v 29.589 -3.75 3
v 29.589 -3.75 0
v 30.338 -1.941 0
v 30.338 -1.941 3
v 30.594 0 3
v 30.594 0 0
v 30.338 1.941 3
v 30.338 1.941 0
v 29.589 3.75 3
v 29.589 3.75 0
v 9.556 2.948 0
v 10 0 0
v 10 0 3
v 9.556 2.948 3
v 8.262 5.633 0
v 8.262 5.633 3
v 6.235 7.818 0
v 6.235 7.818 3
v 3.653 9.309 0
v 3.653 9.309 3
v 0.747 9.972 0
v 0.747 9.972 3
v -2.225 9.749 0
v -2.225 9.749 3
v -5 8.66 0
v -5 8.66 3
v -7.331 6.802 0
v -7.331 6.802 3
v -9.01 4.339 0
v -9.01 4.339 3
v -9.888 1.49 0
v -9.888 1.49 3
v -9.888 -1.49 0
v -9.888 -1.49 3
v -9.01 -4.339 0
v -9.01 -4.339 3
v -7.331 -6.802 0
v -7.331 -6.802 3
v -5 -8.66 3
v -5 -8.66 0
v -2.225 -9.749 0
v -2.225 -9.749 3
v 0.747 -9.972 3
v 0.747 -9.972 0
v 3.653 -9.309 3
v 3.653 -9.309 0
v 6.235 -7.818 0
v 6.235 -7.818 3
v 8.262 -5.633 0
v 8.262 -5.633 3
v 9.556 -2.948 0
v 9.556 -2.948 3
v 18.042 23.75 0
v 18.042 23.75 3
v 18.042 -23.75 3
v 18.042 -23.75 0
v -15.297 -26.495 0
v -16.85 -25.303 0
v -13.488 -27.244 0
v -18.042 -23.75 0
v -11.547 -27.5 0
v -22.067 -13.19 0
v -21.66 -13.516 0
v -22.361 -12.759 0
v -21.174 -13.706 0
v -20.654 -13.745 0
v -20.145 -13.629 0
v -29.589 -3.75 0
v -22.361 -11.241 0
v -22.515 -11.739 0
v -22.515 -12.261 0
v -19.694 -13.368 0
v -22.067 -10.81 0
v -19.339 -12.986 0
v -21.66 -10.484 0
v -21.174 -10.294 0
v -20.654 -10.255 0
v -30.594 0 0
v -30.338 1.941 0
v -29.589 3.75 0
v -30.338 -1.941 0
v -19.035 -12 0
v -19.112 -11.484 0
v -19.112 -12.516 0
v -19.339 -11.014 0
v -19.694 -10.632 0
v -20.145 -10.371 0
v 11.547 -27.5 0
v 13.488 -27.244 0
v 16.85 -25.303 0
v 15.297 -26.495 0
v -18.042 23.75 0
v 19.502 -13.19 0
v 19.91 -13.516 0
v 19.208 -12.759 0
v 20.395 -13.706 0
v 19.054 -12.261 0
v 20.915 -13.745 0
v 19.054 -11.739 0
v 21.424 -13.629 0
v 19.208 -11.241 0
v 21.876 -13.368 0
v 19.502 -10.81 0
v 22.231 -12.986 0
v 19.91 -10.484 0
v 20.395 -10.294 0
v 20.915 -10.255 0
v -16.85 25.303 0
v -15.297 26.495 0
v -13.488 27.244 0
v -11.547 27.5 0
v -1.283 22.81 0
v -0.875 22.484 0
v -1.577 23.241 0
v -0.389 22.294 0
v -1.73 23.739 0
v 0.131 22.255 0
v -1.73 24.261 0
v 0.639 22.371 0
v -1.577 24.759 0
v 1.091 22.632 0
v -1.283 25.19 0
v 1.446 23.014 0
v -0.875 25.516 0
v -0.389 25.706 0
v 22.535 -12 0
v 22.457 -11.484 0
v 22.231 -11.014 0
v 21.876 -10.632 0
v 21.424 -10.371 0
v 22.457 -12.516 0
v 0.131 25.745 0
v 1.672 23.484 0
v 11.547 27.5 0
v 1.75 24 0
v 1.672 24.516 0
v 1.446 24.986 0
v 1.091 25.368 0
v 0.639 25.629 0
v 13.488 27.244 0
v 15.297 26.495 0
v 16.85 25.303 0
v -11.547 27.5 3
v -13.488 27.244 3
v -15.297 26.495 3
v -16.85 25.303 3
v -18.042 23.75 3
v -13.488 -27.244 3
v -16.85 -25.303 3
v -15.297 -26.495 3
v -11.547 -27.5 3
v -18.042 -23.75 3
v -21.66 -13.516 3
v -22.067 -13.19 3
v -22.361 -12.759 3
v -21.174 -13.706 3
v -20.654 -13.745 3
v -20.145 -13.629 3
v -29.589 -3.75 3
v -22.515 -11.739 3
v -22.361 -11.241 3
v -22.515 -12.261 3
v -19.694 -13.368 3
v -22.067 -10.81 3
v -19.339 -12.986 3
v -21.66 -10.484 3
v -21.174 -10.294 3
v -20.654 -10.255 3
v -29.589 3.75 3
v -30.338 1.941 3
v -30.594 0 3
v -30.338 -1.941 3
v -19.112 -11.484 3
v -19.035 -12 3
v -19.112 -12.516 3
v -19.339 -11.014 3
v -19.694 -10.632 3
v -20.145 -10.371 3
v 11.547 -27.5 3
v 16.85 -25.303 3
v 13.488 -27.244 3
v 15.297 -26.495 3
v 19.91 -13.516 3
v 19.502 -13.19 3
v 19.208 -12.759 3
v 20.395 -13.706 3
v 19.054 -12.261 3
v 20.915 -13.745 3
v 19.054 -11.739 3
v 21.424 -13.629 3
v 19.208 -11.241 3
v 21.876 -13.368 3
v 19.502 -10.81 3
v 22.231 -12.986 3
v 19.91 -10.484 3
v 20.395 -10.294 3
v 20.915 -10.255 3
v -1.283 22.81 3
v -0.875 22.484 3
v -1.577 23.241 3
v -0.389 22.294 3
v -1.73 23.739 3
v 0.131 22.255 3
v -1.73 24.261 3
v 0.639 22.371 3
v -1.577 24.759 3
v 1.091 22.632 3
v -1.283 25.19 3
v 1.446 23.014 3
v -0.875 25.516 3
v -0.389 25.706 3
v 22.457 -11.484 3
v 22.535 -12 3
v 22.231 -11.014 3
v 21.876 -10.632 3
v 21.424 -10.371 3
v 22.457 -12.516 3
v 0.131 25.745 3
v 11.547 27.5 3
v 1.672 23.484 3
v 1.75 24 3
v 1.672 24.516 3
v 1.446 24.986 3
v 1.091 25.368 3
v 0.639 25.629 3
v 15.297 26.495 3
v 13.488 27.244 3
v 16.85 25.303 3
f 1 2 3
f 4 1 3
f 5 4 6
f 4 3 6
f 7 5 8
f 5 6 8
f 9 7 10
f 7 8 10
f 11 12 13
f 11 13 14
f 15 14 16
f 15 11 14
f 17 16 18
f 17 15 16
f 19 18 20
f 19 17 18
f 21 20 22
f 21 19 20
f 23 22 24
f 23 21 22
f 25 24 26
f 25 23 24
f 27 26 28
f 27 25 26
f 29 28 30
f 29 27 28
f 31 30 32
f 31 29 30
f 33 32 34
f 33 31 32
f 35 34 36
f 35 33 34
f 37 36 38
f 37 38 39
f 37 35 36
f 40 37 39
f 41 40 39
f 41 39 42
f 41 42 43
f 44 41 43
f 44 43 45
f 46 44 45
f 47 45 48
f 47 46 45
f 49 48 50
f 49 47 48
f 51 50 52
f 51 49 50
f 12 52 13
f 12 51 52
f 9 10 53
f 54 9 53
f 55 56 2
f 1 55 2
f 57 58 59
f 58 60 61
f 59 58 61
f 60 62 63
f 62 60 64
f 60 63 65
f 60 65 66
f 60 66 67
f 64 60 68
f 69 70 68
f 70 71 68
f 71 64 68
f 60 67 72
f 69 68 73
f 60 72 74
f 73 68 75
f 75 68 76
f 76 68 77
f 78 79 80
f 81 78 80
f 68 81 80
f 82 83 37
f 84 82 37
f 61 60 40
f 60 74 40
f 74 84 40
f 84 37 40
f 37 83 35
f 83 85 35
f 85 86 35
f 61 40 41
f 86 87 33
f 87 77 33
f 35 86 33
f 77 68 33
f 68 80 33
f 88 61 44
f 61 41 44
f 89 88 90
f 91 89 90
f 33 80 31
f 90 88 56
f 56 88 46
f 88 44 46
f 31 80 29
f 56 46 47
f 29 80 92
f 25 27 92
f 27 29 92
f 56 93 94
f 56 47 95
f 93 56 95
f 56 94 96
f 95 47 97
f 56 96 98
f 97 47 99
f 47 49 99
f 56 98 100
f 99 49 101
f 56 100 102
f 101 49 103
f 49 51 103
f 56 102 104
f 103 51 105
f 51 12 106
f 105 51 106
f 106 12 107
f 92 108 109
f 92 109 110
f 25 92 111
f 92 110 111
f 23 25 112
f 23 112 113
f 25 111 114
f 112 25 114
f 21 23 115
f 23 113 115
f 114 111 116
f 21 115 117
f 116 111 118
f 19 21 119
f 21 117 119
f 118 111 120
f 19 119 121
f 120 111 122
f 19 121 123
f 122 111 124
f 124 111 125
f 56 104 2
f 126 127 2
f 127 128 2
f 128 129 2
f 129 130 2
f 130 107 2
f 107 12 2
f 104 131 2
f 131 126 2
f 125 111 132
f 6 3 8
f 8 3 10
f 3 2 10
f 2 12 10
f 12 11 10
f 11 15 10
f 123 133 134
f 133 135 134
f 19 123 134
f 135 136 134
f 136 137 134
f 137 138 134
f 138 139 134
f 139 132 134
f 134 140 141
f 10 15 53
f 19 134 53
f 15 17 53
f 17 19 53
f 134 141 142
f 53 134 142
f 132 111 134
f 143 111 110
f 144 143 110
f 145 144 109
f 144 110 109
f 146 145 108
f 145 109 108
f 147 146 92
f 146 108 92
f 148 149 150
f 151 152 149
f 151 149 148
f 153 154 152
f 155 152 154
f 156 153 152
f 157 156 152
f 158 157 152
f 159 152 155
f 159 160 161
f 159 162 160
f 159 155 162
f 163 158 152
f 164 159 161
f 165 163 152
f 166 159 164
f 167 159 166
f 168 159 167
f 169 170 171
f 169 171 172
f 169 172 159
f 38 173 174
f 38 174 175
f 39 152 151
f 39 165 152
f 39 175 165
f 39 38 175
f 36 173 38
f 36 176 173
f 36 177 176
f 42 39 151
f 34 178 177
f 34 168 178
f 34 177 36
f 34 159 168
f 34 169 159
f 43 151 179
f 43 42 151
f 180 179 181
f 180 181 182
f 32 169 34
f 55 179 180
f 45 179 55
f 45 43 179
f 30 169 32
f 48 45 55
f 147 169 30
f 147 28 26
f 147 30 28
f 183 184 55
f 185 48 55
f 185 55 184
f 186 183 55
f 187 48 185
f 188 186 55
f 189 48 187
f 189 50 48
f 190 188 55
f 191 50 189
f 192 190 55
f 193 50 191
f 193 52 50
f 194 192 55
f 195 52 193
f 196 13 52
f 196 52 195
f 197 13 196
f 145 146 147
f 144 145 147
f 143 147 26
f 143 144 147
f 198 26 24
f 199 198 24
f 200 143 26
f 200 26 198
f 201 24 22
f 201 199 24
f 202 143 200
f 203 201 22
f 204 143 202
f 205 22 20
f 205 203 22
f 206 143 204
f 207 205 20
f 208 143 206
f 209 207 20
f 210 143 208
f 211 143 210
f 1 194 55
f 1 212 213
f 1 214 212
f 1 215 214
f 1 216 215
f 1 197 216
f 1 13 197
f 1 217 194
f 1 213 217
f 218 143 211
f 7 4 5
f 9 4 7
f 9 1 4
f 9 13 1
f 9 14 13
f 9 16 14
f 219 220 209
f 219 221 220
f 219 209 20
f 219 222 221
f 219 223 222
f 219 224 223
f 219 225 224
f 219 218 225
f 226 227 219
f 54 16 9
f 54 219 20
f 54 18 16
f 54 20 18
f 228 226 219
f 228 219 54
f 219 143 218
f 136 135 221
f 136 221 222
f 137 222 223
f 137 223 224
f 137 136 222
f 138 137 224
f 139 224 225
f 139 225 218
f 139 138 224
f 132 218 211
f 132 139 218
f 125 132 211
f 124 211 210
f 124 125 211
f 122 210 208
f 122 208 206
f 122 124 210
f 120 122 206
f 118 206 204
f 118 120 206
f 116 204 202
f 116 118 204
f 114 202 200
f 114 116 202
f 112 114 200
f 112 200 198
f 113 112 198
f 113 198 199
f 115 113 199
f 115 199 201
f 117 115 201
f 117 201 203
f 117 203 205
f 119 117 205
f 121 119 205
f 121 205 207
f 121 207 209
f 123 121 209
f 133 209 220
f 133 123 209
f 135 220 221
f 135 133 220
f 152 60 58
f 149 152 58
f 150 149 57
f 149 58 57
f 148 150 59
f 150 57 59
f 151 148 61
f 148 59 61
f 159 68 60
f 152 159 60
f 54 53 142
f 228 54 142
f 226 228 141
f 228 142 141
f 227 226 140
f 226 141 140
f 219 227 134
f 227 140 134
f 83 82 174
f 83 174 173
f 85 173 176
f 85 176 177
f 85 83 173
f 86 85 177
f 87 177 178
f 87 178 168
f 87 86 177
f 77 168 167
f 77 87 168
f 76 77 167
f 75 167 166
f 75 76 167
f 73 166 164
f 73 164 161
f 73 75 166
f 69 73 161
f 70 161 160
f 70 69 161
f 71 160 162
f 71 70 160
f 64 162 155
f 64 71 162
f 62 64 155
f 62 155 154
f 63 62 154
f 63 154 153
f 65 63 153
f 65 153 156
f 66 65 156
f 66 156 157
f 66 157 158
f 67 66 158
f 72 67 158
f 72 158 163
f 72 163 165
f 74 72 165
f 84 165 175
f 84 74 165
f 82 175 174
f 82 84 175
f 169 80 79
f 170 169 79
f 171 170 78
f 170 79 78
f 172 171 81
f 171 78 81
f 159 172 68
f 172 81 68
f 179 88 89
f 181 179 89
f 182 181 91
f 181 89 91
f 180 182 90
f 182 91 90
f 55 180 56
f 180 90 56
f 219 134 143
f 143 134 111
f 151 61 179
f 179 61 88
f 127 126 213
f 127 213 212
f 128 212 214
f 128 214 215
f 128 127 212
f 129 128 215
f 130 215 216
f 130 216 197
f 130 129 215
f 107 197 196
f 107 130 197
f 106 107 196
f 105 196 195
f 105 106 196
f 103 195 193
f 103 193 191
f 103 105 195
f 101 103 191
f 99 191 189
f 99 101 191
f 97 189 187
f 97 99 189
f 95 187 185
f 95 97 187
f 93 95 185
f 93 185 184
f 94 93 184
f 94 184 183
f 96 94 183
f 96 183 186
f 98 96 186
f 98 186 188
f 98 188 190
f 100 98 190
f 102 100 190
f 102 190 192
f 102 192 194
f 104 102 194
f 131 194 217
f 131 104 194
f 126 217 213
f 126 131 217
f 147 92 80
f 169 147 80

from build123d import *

# Parameters (mm, degrees)
SKETCH_1_R      = 1.75
SKETCH_1_R_2    = 10
EXTRUDE_1_DEPTH = 3


with BuildPart() as part:
    # Эскиз1 → Бобышка-Вытянуть1 (new body)
    with BuildSketch(Plane.XY):
        with BuildLine():
            Line((29.589201296, 3.75), (18.042195912, 23.75))
            ThreePointArc((18.042195912, 23.75), (15.297005384, 26.495190528), (11.547005384, 27.5))
            Line((11.547005384, 27.5), (-11.547005384, 27.5))
            ThreePointArc((-11.547005384, 27.5), (-15.297005384, 26.495190528), (-18.042195912, 23.75))
            Line((-18.042195912, 23.75), (-29.589201296, 3.75))
            ThreePointArc((-29.589201296, 3.75), (-30.594010768, 0), (-29.589201296, -3.75))
            Line((-29.589201296, -3.75), (-18.042195912, -23.75))
            ThreePointArc((-18.042195912, -23.75), (-15.297005384, -26.495190528), (-11.547005384, -27.5))
            Line((-11.547005384, -27.5), (11.547005384, -27.5))
            ThreePointArc((11.547005384, -27.5), (15.297005384, -26.495190528), (18.042195912, -23.75))
            Line((18.042195912, -23.75), (29.589201296, -3.75))
            ThreePointArc((29.589201296, -3.75), (30.594010768, 0), (29.589201296, 3.75))
        make_face()
        with Locations((0, 24)):
            Circle(SKETCH_1_R, mode=Mode.SUBTRACT)
        with Locations((20.784609691, -12)):
            Circle(SKETCH_1_R, mode=Mode.SUBTRACT)
        with Locations((-20.784609691, -12)):
            Circle(SKETCH_1_R, mode=Mode.SUBTRACT)
        Circle(SKETCH_1_R_2, mode=Mode.SUBTRACT)
    extrude(amount=EXTRUDE_1_DEPTH)


solid = part.part
